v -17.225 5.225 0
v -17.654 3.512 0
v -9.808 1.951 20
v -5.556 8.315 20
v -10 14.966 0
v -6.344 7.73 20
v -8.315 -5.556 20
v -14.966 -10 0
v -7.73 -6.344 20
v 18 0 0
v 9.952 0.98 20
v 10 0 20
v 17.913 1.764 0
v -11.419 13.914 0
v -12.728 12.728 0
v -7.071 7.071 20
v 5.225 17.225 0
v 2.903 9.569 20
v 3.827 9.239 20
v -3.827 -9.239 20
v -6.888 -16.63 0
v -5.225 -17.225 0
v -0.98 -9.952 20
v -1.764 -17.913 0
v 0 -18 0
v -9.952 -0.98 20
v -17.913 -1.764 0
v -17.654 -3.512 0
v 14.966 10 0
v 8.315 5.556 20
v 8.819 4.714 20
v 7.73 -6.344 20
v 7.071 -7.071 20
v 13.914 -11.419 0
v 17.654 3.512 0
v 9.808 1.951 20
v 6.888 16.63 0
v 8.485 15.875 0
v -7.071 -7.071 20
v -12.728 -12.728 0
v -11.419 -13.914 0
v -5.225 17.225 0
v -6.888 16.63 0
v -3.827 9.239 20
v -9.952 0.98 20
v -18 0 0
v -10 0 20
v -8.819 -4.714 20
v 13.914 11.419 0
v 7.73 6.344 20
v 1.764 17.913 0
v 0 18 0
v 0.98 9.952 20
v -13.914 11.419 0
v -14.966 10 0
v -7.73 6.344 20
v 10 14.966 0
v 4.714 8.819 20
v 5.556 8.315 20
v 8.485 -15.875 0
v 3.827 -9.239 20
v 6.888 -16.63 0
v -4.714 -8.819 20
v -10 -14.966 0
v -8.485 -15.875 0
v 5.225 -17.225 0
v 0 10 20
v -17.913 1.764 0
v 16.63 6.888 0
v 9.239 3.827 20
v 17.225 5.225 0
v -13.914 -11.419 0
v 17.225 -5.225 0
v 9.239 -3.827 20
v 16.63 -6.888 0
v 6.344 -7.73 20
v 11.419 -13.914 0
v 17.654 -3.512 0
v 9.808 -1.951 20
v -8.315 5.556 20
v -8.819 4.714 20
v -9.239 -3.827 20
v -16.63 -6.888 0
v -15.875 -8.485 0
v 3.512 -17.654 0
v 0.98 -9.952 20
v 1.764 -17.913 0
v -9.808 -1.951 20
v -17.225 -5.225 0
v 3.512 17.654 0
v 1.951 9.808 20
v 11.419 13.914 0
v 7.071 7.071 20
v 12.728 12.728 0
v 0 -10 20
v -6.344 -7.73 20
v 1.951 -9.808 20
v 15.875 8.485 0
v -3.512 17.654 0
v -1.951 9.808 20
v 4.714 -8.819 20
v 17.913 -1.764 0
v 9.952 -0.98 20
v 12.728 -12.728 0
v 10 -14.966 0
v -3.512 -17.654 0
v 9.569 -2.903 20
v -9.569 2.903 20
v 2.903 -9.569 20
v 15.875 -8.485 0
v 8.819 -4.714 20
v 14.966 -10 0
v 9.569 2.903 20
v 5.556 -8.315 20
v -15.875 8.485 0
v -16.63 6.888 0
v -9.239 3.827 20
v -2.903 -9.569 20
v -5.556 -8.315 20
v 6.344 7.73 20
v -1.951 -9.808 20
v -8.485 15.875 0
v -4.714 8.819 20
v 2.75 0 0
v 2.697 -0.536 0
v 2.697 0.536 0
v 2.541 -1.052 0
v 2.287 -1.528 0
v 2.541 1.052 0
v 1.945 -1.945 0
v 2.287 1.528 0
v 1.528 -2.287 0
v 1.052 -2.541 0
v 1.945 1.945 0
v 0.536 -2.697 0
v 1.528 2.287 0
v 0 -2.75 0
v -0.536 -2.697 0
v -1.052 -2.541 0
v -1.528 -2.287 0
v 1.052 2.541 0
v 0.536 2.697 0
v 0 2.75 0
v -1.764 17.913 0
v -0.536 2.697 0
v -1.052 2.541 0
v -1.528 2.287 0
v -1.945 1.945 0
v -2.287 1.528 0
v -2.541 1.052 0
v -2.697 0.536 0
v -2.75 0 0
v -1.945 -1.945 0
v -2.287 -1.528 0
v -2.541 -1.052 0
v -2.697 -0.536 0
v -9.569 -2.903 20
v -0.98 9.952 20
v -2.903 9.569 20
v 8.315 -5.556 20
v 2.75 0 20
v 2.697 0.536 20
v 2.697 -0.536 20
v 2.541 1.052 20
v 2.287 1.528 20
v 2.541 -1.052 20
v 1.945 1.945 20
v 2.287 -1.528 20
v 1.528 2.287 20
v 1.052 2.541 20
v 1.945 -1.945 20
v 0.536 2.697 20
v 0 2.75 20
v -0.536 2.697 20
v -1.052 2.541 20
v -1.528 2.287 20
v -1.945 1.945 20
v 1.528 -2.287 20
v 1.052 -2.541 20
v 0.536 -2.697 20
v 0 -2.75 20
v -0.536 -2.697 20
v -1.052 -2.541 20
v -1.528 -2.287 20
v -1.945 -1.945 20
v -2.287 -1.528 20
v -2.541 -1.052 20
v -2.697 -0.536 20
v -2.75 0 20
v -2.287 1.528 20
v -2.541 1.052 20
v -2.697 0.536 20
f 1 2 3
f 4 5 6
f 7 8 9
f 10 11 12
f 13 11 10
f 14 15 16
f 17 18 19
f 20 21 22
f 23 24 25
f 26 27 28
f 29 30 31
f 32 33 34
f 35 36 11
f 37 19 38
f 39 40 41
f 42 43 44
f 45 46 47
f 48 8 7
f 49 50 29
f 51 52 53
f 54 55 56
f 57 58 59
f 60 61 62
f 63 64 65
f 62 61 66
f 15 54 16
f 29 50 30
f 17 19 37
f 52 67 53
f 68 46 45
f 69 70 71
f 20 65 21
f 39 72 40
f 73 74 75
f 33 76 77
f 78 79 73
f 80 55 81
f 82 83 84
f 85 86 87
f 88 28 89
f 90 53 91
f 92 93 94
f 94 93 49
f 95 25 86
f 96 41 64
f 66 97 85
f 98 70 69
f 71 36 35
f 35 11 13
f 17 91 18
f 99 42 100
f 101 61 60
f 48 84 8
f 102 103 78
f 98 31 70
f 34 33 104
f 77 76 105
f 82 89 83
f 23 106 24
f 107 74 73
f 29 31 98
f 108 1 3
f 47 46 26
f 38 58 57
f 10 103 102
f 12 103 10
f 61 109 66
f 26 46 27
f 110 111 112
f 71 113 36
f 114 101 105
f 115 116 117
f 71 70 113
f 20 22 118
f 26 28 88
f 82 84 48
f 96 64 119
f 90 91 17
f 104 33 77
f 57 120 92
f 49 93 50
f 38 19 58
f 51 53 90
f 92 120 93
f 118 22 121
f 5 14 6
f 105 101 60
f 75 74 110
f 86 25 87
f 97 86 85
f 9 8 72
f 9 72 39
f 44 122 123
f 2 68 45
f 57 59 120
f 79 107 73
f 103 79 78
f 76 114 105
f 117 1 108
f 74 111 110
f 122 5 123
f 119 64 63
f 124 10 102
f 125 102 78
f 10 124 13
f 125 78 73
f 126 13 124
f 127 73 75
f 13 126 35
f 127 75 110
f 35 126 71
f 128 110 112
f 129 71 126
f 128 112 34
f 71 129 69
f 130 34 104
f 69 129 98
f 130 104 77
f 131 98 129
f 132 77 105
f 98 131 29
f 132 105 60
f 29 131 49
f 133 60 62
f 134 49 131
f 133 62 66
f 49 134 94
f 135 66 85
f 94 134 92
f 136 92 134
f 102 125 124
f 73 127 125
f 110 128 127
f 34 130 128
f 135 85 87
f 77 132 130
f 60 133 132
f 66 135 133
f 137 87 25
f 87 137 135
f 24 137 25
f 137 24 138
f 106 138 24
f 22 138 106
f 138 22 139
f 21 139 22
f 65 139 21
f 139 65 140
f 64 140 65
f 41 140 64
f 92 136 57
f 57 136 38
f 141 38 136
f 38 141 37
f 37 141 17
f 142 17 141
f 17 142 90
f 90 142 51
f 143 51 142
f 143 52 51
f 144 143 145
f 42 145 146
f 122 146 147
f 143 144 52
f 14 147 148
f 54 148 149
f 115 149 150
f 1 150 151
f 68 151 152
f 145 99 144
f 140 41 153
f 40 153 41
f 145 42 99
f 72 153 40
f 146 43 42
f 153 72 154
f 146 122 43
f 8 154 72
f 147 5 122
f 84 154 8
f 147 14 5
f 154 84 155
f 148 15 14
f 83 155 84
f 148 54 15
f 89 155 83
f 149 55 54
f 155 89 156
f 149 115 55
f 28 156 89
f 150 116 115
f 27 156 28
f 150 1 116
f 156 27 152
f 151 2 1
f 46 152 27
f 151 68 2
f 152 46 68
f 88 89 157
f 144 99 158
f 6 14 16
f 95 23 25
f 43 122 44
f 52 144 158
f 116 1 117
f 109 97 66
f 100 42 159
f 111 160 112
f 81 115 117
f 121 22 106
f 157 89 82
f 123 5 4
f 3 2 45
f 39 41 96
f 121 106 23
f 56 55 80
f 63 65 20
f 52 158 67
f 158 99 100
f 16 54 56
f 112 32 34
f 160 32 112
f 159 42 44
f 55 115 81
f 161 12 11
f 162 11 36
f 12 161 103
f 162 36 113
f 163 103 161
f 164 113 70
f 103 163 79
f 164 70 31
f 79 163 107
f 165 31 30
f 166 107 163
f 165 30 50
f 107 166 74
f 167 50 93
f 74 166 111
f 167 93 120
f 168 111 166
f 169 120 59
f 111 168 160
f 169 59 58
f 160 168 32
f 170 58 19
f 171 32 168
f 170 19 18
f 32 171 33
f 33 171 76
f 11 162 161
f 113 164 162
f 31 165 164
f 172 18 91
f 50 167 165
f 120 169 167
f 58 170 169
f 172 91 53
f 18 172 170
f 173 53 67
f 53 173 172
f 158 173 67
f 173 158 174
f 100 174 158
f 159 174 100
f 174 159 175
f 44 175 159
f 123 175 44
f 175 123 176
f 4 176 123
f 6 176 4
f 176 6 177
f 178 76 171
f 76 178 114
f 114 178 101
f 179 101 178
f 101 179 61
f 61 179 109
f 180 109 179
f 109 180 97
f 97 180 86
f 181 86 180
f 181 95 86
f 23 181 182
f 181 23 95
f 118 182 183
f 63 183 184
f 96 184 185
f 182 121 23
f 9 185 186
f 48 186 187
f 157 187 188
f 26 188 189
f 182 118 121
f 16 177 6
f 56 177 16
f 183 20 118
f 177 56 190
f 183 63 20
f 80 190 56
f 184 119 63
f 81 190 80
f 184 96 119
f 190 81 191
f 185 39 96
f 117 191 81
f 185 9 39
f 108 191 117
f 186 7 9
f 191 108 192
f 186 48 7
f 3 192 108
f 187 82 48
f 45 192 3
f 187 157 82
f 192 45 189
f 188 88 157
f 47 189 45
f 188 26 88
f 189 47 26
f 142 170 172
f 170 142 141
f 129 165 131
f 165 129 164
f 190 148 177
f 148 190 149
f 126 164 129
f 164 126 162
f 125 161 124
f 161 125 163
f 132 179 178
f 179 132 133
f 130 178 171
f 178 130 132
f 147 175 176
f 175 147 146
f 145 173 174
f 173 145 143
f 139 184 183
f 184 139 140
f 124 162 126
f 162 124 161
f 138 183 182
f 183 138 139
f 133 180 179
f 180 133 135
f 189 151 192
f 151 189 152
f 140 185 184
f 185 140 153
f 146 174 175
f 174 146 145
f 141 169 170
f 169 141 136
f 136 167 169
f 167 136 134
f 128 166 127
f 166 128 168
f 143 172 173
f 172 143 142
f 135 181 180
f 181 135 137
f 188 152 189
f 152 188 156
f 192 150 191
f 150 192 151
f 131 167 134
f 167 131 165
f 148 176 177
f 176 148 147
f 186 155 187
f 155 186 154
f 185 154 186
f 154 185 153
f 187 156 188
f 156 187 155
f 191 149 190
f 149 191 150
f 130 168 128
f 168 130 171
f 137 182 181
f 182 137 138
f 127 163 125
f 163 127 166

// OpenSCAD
//$fn = 32;
height = 20;
boreHole = 2.75;
radiusTop = 10;
radiusBottom = 18;

difference(){
    cylinder(height, radiusBottom, radiusTop, $fn=64); 
    translate([0, 0, -1]){
        cylinder(height + 2, boreHole, boreHole, $fn=32);
    }
}
